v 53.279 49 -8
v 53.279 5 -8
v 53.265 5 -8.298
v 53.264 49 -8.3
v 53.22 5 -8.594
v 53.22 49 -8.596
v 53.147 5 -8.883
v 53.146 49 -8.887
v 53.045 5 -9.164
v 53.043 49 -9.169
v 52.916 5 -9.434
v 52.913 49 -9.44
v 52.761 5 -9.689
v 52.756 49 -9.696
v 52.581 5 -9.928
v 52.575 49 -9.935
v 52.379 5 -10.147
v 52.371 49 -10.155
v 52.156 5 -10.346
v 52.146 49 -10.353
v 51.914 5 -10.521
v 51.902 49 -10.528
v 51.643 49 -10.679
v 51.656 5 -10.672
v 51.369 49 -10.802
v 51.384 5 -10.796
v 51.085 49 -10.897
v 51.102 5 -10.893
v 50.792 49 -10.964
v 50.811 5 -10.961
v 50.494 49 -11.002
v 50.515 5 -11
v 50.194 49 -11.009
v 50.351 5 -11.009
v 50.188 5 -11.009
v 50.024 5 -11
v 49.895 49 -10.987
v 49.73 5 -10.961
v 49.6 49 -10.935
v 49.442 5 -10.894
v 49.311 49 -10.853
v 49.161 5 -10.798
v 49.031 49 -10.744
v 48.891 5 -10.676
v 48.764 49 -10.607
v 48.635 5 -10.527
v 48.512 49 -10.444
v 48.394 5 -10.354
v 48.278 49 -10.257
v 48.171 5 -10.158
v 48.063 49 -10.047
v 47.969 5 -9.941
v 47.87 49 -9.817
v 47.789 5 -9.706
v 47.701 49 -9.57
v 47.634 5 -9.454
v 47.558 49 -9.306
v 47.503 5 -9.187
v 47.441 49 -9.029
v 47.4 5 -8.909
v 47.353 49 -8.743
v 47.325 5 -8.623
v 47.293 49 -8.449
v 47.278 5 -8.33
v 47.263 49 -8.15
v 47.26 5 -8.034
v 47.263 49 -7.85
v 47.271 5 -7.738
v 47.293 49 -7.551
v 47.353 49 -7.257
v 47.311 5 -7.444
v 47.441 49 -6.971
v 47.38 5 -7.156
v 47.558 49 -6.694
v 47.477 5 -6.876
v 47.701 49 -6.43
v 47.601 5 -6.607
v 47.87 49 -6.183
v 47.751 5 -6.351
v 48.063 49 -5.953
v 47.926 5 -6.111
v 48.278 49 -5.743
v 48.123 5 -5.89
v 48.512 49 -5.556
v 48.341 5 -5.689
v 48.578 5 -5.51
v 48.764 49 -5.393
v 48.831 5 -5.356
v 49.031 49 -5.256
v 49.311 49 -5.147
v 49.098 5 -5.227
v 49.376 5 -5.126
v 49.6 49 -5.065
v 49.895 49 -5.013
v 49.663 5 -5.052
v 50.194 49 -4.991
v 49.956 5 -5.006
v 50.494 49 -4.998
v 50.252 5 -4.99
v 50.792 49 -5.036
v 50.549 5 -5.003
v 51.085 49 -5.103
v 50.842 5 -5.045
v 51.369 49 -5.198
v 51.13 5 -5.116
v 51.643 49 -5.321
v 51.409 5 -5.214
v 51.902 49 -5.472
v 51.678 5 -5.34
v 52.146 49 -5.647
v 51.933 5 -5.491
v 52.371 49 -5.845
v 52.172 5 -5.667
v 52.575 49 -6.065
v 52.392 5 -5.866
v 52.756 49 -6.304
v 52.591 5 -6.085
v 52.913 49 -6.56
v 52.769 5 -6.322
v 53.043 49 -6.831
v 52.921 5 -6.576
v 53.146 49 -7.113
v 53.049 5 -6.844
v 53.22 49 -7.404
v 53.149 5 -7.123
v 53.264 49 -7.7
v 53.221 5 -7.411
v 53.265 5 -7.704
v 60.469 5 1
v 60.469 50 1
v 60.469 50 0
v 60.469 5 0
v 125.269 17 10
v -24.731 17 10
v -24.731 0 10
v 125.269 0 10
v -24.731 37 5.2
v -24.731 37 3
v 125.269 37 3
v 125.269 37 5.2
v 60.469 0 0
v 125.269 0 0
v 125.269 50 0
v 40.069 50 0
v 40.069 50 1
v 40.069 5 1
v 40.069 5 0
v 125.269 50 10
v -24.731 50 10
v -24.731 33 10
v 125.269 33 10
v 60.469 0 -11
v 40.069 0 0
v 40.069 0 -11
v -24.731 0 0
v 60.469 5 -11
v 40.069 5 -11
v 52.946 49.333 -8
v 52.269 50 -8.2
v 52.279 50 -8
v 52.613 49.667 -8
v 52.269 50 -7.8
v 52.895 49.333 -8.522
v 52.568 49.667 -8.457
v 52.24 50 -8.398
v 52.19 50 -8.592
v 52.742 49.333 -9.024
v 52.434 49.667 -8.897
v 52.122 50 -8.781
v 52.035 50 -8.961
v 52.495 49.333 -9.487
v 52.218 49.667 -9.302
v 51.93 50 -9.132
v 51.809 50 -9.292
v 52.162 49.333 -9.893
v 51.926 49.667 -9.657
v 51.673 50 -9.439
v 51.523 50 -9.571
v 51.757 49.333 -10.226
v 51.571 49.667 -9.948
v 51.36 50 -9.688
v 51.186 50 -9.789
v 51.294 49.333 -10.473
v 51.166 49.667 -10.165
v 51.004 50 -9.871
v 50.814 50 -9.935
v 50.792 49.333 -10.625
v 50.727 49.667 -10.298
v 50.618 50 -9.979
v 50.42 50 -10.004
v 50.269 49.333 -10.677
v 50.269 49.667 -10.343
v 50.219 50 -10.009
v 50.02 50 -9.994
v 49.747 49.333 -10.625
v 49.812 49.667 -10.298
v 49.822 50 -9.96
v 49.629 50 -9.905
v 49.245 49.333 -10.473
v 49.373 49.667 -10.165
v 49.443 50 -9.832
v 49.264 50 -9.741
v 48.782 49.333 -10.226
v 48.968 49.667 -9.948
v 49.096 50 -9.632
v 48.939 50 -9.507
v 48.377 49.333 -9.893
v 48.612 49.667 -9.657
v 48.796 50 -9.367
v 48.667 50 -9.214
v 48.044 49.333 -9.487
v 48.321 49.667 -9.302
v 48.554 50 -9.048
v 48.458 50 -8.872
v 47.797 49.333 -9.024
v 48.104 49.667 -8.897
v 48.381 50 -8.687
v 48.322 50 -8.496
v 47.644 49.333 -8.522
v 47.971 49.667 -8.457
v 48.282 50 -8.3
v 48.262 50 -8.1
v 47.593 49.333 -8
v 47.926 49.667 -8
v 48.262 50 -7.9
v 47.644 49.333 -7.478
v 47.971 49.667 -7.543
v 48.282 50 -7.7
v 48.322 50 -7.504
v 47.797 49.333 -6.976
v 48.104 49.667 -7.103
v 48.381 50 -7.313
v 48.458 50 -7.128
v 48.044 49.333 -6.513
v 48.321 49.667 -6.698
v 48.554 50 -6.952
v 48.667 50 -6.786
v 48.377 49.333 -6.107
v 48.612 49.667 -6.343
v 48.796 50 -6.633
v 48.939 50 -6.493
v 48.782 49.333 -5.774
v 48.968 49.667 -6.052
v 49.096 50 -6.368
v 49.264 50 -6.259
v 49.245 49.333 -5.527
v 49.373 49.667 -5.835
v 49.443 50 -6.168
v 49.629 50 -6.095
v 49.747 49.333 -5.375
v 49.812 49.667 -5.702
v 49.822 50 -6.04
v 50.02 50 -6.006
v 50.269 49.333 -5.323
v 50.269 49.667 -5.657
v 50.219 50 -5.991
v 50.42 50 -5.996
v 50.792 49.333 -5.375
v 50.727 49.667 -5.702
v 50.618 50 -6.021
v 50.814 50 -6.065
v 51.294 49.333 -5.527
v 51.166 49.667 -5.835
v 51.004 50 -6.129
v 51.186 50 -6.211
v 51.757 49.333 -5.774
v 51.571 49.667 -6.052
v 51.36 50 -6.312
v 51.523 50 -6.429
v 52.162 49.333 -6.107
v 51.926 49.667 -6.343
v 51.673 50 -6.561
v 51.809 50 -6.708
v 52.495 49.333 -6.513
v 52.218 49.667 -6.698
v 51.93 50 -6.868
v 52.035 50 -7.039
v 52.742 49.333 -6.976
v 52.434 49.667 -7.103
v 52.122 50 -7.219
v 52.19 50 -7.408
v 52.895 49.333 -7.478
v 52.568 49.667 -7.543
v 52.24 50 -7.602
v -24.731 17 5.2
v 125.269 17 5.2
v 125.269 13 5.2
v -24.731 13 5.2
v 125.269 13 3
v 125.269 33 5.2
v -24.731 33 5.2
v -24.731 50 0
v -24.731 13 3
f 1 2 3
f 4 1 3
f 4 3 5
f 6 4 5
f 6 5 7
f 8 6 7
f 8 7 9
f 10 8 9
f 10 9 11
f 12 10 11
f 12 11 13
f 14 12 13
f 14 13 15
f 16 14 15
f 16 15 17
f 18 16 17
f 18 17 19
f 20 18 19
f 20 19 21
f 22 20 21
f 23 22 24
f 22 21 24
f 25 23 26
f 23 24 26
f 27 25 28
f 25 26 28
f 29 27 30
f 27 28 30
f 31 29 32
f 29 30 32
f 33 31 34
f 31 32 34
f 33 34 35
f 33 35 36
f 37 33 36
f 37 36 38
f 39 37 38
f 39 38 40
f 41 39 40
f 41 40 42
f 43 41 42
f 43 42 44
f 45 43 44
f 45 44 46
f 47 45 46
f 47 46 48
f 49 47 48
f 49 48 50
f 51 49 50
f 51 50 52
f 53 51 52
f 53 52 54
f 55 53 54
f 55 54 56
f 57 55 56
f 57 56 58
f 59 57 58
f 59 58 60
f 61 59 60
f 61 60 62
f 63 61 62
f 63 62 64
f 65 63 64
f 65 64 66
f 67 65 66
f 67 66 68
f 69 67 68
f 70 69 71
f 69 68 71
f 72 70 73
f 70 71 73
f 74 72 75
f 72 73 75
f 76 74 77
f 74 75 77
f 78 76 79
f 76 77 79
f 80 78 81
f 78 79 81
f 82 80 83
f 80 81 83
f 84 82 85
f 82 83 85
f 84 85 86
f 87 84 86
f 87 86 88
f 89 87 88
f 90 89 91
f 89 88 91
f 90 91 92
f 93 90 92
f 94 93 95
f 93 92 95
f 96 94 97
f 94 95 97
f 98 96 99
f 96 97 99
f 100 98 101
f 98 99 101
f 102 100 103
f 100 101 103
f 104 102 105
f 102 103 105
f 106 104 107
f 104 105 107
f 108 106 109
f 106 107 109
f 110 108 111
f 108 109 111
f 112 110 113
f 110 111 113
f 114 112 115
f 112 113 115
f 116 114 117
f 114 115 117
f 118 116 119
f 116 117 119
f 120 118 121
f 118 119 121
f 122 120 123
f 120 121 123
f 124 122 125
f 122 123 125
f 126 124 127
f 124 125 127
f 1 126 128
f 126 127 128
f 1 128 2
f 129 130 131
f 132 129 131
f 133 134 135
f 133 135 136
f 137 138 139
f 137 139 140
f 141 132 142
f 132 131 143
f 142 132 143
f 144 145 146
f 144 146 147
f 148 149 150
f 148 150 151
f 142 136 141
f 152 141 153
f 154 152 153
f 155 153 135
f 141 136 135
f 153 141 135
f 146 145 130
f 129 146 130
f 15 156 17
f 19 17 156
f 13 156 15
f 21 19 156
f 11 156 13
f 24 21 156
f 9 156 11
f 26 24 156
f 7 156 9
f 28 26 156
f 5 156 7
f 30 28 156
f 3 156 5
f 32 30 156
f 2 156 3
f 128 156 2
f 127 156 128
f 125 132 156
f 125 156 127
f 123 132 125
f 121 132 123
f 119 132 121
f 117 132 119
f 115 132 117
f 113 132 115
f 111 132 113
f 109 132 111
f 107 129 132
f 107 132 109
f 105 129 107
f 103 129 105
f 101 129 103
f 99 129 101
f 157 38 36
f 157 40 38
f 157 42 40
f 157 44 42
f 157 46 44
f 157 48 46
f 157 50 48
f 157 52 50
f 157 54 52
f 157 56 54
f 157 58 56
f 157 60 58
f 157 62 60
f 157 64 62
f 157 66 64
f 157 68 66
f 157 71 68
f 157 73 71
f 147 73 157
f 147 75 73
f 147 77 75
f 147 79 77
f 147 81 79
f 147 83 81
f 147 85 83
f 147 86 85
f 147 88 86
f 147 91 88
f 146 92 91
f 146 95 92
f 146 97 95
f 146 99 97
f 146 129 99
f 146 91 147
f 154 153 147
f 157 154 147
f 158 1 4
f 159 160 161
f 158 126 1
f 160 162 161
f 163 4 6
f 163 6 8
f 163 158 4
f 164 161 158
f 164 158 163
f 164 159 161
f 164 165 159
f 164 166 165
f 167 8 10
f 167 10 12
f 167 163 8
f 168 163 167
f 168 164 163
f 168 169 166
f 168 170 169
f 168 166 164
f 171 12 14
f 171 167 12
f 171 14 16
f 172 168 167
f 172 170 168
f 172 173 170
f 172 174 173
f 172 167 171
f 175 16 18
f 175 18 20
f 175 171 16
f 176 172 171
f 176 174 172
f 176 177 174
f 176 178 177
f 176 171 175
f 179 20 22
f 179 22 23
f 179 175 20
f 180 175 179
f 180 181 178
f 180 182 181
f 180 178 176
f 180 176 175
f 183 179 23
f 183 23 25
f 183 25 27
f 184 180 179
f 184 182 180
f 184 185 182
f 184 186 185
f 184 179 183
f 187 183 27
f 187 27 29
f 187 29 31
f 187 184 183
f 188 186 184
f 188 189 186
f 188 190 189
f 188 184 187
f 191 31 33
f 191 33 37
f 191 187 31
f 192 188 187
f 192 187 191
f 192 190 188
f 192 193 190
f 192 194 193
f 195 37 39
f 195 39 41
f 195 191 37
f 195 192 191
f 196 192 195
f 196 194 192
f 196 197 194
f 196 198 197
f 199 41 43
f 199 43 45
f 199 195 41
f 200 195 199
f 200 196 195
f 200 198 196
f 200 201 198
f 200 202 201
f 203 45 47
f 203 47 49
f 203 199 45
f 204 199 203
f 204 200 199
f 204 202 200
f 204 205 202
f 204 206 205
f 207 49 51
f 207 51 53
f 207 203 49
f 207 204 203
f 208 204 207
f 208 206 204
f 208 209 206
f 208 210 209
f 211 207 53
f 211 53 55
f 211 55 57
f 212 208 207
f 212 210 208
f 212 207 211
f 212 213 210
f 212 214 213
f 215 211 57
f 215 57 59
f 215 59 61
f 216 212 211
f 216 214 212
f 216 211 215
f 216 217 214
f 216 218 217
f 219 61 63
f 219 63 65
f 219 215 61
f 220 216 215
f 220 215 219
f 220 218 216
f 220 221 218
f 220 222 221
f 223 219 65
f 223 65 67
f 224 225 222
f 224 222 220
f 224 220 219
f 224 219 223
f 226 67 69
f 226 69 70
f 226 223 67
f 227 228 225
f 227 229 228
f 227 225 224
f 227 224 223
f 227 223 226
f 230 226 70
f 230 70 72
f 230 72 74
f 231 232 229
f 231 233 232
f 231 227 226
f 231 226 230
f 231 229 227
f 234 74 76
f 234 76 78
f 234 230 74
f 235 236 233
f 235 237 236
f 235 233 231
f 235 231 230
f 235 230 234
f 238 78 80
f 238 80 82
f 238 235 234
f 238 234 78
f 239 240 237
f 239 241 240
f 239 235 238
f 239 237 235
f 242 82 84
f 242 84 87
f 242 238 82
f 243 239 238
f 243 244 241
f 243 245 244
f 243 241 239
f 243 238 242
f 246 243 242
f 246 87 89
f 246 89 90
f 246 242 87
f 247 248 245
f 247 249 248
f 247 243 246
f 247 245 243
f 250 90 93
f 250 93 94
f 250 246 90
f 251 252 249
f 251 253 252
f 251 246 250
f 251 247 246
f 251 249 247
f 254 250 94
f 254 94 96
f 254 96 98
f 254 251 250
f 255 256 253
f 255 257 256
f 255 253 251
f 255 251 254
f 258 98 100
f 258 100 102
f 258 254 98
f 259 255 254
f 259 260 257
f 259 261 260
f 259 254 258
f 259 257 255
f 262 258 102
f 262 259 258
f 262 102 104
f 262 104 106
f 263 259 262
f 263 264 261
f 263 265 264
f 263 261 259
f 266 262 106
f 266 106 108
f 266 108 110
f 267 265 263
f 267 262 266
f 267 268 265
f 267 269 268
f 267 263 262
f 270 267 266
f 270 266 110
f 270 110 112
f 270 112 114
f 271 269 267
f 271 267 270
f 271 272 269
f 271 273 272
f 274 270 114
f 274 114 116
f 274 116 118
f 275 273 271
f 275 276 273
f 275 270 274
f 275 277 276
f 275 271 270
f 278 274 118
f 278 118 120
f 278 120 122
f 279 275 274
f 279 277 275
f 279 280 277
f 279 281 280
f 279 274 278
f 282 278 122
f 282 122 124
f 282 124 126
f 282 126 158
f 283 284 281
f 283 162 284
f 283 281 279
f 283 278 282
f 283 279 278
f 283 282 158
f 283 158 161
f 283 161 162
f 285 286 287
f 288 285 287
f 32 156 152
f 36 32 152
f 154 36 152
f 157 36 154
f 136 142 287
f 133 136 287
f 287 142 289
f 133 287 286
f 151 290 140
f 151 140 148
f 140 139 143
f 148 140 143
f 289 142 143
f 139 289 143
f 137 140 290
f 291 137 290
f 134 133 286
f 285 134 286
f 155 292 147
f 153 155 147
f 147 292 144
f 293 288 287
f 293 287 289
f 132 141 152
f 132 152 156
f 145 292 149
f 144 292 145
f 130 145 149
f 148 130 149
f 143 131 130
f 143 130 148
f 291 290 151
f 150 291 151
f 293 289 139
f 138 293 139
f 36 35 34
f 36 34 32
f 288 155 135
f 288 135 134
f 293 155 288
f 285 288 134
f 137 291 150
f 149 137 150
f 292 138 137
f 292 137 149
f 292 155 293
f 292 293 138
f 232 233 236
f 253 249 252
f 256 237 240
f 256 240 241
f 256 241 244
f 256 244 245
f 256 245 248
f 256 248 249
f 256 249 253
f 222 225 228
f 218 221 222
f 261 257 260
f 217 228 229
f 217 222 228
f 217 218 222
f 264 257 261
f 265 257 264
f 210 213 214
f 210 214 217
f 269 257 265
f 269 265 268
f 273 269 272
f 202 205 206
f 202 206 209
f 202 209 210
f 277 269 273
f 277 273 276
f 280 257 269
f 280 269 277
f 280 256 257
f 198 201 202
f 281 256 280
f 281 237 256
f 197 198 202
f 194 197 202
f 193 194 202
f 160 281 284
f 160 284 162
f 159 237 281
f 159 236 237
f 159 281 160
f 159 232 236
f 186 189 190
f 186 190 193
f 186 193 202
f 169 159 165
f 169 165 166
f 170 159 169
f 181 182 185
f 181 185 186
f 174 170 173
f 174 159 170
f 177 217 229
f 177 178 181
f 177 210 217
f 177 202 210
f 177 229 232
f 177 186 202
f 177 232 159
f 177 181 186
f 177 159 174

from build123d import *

# Parameters (mm, degrees)
SKETCH_1_W          = 150
SKETCH_1_H          = 50
EXTRUDE_1_DEPTH     = 10
CUT_EXTRUDE_1_DEPTH = 150
SKETCH_3_W          = 20.4
SKETCH_3_H          = 1
CUT_EXTRUDE_2_DEPTH = 150
SKETCH_4_W          = 20.4
SKETCH_4_H          = 5
EXTRUDE_2_DEPTH     = 12
SKETCH_5_R          = 3.01
EXTRUDE_3_DEPTH     = 45
CHAMFER_2_SIZE      = 1


with BuildPart() as part:
    # 草图1 → 凸台-拉伸1 (new body)
    with BuildSketch(Plane.XY):
        with Locations((50.269431659, 25)):
            Rectangle(SKETCH_1_W, SKETCH_1_H)
    extrude(amount=EXTRUDE_1_DEPTH)

    # 草图2 → 切除-拉伸1 (cut)
    with BuildSketch(Plane(origin=(125.269431659, 0, 0), x_dir=(0, 0, -1), z_dir=(1, 0, 0))):
        Polygon((-3, 13), (-3, 37), (-5.2, 37), (-5.2, 33), (-10, 33), (-10, 17), (-5.2, 17), (-5.2, 13), align=None)
    extrude(amount=-CUT_EXTRUDE_1_DEPTH, mode=Mode.SUBTRACT)

    # 草图3 → 切除-拉伸2 (cut)
    with BuildSketch(Plane(origin=(0, 50, 0), x_dir=(1, 0, 0), z_dir=(0, 1, 0))):
        with Locations((50.269431659, -0.5)):
            Rectangle(SKETCH_3_W, SKETCH_3_H)
    extrude(amount=-CUT_EXTRUDE_2_DEPTH, mode=Mode.SUBTRACT)

    # 草图4 → 凸台-拉伸2 (add)
    with BuildSketch(Plane(origin=(0, 0, 1), x_dir=(-1, 0, 0), z_dir=(0, 0, -1))):
        with Locations((-50.269431659, 2.5)):
            Rectangle(SKETCH_4_W, SKETCH_4_H)
    extrude(amount=EXTRUDE_2_DEPTH)

    # 草图5 → 凸台-拉伸3 (add)
    with BuildSketch(Plane(origin=(0, 5, 0), x_dir=(1, 0, 0), z_dir=(0, 1, 0))):
        with Locations((50.269431659, 8)):
            Circle(SKETCH_5_R)
    extrude(amount=EXTRUDE_3_DEPTH)

    # 倒角2
    chamfer_2_edges = [part.edges().sort_by_distance(p)[0] for p in [
        (47.259431659, 50, -8),
    ]]
    chamfer(chamfer_2_edges, length=CHAMFER_2_SIZE)


solid = part.part
